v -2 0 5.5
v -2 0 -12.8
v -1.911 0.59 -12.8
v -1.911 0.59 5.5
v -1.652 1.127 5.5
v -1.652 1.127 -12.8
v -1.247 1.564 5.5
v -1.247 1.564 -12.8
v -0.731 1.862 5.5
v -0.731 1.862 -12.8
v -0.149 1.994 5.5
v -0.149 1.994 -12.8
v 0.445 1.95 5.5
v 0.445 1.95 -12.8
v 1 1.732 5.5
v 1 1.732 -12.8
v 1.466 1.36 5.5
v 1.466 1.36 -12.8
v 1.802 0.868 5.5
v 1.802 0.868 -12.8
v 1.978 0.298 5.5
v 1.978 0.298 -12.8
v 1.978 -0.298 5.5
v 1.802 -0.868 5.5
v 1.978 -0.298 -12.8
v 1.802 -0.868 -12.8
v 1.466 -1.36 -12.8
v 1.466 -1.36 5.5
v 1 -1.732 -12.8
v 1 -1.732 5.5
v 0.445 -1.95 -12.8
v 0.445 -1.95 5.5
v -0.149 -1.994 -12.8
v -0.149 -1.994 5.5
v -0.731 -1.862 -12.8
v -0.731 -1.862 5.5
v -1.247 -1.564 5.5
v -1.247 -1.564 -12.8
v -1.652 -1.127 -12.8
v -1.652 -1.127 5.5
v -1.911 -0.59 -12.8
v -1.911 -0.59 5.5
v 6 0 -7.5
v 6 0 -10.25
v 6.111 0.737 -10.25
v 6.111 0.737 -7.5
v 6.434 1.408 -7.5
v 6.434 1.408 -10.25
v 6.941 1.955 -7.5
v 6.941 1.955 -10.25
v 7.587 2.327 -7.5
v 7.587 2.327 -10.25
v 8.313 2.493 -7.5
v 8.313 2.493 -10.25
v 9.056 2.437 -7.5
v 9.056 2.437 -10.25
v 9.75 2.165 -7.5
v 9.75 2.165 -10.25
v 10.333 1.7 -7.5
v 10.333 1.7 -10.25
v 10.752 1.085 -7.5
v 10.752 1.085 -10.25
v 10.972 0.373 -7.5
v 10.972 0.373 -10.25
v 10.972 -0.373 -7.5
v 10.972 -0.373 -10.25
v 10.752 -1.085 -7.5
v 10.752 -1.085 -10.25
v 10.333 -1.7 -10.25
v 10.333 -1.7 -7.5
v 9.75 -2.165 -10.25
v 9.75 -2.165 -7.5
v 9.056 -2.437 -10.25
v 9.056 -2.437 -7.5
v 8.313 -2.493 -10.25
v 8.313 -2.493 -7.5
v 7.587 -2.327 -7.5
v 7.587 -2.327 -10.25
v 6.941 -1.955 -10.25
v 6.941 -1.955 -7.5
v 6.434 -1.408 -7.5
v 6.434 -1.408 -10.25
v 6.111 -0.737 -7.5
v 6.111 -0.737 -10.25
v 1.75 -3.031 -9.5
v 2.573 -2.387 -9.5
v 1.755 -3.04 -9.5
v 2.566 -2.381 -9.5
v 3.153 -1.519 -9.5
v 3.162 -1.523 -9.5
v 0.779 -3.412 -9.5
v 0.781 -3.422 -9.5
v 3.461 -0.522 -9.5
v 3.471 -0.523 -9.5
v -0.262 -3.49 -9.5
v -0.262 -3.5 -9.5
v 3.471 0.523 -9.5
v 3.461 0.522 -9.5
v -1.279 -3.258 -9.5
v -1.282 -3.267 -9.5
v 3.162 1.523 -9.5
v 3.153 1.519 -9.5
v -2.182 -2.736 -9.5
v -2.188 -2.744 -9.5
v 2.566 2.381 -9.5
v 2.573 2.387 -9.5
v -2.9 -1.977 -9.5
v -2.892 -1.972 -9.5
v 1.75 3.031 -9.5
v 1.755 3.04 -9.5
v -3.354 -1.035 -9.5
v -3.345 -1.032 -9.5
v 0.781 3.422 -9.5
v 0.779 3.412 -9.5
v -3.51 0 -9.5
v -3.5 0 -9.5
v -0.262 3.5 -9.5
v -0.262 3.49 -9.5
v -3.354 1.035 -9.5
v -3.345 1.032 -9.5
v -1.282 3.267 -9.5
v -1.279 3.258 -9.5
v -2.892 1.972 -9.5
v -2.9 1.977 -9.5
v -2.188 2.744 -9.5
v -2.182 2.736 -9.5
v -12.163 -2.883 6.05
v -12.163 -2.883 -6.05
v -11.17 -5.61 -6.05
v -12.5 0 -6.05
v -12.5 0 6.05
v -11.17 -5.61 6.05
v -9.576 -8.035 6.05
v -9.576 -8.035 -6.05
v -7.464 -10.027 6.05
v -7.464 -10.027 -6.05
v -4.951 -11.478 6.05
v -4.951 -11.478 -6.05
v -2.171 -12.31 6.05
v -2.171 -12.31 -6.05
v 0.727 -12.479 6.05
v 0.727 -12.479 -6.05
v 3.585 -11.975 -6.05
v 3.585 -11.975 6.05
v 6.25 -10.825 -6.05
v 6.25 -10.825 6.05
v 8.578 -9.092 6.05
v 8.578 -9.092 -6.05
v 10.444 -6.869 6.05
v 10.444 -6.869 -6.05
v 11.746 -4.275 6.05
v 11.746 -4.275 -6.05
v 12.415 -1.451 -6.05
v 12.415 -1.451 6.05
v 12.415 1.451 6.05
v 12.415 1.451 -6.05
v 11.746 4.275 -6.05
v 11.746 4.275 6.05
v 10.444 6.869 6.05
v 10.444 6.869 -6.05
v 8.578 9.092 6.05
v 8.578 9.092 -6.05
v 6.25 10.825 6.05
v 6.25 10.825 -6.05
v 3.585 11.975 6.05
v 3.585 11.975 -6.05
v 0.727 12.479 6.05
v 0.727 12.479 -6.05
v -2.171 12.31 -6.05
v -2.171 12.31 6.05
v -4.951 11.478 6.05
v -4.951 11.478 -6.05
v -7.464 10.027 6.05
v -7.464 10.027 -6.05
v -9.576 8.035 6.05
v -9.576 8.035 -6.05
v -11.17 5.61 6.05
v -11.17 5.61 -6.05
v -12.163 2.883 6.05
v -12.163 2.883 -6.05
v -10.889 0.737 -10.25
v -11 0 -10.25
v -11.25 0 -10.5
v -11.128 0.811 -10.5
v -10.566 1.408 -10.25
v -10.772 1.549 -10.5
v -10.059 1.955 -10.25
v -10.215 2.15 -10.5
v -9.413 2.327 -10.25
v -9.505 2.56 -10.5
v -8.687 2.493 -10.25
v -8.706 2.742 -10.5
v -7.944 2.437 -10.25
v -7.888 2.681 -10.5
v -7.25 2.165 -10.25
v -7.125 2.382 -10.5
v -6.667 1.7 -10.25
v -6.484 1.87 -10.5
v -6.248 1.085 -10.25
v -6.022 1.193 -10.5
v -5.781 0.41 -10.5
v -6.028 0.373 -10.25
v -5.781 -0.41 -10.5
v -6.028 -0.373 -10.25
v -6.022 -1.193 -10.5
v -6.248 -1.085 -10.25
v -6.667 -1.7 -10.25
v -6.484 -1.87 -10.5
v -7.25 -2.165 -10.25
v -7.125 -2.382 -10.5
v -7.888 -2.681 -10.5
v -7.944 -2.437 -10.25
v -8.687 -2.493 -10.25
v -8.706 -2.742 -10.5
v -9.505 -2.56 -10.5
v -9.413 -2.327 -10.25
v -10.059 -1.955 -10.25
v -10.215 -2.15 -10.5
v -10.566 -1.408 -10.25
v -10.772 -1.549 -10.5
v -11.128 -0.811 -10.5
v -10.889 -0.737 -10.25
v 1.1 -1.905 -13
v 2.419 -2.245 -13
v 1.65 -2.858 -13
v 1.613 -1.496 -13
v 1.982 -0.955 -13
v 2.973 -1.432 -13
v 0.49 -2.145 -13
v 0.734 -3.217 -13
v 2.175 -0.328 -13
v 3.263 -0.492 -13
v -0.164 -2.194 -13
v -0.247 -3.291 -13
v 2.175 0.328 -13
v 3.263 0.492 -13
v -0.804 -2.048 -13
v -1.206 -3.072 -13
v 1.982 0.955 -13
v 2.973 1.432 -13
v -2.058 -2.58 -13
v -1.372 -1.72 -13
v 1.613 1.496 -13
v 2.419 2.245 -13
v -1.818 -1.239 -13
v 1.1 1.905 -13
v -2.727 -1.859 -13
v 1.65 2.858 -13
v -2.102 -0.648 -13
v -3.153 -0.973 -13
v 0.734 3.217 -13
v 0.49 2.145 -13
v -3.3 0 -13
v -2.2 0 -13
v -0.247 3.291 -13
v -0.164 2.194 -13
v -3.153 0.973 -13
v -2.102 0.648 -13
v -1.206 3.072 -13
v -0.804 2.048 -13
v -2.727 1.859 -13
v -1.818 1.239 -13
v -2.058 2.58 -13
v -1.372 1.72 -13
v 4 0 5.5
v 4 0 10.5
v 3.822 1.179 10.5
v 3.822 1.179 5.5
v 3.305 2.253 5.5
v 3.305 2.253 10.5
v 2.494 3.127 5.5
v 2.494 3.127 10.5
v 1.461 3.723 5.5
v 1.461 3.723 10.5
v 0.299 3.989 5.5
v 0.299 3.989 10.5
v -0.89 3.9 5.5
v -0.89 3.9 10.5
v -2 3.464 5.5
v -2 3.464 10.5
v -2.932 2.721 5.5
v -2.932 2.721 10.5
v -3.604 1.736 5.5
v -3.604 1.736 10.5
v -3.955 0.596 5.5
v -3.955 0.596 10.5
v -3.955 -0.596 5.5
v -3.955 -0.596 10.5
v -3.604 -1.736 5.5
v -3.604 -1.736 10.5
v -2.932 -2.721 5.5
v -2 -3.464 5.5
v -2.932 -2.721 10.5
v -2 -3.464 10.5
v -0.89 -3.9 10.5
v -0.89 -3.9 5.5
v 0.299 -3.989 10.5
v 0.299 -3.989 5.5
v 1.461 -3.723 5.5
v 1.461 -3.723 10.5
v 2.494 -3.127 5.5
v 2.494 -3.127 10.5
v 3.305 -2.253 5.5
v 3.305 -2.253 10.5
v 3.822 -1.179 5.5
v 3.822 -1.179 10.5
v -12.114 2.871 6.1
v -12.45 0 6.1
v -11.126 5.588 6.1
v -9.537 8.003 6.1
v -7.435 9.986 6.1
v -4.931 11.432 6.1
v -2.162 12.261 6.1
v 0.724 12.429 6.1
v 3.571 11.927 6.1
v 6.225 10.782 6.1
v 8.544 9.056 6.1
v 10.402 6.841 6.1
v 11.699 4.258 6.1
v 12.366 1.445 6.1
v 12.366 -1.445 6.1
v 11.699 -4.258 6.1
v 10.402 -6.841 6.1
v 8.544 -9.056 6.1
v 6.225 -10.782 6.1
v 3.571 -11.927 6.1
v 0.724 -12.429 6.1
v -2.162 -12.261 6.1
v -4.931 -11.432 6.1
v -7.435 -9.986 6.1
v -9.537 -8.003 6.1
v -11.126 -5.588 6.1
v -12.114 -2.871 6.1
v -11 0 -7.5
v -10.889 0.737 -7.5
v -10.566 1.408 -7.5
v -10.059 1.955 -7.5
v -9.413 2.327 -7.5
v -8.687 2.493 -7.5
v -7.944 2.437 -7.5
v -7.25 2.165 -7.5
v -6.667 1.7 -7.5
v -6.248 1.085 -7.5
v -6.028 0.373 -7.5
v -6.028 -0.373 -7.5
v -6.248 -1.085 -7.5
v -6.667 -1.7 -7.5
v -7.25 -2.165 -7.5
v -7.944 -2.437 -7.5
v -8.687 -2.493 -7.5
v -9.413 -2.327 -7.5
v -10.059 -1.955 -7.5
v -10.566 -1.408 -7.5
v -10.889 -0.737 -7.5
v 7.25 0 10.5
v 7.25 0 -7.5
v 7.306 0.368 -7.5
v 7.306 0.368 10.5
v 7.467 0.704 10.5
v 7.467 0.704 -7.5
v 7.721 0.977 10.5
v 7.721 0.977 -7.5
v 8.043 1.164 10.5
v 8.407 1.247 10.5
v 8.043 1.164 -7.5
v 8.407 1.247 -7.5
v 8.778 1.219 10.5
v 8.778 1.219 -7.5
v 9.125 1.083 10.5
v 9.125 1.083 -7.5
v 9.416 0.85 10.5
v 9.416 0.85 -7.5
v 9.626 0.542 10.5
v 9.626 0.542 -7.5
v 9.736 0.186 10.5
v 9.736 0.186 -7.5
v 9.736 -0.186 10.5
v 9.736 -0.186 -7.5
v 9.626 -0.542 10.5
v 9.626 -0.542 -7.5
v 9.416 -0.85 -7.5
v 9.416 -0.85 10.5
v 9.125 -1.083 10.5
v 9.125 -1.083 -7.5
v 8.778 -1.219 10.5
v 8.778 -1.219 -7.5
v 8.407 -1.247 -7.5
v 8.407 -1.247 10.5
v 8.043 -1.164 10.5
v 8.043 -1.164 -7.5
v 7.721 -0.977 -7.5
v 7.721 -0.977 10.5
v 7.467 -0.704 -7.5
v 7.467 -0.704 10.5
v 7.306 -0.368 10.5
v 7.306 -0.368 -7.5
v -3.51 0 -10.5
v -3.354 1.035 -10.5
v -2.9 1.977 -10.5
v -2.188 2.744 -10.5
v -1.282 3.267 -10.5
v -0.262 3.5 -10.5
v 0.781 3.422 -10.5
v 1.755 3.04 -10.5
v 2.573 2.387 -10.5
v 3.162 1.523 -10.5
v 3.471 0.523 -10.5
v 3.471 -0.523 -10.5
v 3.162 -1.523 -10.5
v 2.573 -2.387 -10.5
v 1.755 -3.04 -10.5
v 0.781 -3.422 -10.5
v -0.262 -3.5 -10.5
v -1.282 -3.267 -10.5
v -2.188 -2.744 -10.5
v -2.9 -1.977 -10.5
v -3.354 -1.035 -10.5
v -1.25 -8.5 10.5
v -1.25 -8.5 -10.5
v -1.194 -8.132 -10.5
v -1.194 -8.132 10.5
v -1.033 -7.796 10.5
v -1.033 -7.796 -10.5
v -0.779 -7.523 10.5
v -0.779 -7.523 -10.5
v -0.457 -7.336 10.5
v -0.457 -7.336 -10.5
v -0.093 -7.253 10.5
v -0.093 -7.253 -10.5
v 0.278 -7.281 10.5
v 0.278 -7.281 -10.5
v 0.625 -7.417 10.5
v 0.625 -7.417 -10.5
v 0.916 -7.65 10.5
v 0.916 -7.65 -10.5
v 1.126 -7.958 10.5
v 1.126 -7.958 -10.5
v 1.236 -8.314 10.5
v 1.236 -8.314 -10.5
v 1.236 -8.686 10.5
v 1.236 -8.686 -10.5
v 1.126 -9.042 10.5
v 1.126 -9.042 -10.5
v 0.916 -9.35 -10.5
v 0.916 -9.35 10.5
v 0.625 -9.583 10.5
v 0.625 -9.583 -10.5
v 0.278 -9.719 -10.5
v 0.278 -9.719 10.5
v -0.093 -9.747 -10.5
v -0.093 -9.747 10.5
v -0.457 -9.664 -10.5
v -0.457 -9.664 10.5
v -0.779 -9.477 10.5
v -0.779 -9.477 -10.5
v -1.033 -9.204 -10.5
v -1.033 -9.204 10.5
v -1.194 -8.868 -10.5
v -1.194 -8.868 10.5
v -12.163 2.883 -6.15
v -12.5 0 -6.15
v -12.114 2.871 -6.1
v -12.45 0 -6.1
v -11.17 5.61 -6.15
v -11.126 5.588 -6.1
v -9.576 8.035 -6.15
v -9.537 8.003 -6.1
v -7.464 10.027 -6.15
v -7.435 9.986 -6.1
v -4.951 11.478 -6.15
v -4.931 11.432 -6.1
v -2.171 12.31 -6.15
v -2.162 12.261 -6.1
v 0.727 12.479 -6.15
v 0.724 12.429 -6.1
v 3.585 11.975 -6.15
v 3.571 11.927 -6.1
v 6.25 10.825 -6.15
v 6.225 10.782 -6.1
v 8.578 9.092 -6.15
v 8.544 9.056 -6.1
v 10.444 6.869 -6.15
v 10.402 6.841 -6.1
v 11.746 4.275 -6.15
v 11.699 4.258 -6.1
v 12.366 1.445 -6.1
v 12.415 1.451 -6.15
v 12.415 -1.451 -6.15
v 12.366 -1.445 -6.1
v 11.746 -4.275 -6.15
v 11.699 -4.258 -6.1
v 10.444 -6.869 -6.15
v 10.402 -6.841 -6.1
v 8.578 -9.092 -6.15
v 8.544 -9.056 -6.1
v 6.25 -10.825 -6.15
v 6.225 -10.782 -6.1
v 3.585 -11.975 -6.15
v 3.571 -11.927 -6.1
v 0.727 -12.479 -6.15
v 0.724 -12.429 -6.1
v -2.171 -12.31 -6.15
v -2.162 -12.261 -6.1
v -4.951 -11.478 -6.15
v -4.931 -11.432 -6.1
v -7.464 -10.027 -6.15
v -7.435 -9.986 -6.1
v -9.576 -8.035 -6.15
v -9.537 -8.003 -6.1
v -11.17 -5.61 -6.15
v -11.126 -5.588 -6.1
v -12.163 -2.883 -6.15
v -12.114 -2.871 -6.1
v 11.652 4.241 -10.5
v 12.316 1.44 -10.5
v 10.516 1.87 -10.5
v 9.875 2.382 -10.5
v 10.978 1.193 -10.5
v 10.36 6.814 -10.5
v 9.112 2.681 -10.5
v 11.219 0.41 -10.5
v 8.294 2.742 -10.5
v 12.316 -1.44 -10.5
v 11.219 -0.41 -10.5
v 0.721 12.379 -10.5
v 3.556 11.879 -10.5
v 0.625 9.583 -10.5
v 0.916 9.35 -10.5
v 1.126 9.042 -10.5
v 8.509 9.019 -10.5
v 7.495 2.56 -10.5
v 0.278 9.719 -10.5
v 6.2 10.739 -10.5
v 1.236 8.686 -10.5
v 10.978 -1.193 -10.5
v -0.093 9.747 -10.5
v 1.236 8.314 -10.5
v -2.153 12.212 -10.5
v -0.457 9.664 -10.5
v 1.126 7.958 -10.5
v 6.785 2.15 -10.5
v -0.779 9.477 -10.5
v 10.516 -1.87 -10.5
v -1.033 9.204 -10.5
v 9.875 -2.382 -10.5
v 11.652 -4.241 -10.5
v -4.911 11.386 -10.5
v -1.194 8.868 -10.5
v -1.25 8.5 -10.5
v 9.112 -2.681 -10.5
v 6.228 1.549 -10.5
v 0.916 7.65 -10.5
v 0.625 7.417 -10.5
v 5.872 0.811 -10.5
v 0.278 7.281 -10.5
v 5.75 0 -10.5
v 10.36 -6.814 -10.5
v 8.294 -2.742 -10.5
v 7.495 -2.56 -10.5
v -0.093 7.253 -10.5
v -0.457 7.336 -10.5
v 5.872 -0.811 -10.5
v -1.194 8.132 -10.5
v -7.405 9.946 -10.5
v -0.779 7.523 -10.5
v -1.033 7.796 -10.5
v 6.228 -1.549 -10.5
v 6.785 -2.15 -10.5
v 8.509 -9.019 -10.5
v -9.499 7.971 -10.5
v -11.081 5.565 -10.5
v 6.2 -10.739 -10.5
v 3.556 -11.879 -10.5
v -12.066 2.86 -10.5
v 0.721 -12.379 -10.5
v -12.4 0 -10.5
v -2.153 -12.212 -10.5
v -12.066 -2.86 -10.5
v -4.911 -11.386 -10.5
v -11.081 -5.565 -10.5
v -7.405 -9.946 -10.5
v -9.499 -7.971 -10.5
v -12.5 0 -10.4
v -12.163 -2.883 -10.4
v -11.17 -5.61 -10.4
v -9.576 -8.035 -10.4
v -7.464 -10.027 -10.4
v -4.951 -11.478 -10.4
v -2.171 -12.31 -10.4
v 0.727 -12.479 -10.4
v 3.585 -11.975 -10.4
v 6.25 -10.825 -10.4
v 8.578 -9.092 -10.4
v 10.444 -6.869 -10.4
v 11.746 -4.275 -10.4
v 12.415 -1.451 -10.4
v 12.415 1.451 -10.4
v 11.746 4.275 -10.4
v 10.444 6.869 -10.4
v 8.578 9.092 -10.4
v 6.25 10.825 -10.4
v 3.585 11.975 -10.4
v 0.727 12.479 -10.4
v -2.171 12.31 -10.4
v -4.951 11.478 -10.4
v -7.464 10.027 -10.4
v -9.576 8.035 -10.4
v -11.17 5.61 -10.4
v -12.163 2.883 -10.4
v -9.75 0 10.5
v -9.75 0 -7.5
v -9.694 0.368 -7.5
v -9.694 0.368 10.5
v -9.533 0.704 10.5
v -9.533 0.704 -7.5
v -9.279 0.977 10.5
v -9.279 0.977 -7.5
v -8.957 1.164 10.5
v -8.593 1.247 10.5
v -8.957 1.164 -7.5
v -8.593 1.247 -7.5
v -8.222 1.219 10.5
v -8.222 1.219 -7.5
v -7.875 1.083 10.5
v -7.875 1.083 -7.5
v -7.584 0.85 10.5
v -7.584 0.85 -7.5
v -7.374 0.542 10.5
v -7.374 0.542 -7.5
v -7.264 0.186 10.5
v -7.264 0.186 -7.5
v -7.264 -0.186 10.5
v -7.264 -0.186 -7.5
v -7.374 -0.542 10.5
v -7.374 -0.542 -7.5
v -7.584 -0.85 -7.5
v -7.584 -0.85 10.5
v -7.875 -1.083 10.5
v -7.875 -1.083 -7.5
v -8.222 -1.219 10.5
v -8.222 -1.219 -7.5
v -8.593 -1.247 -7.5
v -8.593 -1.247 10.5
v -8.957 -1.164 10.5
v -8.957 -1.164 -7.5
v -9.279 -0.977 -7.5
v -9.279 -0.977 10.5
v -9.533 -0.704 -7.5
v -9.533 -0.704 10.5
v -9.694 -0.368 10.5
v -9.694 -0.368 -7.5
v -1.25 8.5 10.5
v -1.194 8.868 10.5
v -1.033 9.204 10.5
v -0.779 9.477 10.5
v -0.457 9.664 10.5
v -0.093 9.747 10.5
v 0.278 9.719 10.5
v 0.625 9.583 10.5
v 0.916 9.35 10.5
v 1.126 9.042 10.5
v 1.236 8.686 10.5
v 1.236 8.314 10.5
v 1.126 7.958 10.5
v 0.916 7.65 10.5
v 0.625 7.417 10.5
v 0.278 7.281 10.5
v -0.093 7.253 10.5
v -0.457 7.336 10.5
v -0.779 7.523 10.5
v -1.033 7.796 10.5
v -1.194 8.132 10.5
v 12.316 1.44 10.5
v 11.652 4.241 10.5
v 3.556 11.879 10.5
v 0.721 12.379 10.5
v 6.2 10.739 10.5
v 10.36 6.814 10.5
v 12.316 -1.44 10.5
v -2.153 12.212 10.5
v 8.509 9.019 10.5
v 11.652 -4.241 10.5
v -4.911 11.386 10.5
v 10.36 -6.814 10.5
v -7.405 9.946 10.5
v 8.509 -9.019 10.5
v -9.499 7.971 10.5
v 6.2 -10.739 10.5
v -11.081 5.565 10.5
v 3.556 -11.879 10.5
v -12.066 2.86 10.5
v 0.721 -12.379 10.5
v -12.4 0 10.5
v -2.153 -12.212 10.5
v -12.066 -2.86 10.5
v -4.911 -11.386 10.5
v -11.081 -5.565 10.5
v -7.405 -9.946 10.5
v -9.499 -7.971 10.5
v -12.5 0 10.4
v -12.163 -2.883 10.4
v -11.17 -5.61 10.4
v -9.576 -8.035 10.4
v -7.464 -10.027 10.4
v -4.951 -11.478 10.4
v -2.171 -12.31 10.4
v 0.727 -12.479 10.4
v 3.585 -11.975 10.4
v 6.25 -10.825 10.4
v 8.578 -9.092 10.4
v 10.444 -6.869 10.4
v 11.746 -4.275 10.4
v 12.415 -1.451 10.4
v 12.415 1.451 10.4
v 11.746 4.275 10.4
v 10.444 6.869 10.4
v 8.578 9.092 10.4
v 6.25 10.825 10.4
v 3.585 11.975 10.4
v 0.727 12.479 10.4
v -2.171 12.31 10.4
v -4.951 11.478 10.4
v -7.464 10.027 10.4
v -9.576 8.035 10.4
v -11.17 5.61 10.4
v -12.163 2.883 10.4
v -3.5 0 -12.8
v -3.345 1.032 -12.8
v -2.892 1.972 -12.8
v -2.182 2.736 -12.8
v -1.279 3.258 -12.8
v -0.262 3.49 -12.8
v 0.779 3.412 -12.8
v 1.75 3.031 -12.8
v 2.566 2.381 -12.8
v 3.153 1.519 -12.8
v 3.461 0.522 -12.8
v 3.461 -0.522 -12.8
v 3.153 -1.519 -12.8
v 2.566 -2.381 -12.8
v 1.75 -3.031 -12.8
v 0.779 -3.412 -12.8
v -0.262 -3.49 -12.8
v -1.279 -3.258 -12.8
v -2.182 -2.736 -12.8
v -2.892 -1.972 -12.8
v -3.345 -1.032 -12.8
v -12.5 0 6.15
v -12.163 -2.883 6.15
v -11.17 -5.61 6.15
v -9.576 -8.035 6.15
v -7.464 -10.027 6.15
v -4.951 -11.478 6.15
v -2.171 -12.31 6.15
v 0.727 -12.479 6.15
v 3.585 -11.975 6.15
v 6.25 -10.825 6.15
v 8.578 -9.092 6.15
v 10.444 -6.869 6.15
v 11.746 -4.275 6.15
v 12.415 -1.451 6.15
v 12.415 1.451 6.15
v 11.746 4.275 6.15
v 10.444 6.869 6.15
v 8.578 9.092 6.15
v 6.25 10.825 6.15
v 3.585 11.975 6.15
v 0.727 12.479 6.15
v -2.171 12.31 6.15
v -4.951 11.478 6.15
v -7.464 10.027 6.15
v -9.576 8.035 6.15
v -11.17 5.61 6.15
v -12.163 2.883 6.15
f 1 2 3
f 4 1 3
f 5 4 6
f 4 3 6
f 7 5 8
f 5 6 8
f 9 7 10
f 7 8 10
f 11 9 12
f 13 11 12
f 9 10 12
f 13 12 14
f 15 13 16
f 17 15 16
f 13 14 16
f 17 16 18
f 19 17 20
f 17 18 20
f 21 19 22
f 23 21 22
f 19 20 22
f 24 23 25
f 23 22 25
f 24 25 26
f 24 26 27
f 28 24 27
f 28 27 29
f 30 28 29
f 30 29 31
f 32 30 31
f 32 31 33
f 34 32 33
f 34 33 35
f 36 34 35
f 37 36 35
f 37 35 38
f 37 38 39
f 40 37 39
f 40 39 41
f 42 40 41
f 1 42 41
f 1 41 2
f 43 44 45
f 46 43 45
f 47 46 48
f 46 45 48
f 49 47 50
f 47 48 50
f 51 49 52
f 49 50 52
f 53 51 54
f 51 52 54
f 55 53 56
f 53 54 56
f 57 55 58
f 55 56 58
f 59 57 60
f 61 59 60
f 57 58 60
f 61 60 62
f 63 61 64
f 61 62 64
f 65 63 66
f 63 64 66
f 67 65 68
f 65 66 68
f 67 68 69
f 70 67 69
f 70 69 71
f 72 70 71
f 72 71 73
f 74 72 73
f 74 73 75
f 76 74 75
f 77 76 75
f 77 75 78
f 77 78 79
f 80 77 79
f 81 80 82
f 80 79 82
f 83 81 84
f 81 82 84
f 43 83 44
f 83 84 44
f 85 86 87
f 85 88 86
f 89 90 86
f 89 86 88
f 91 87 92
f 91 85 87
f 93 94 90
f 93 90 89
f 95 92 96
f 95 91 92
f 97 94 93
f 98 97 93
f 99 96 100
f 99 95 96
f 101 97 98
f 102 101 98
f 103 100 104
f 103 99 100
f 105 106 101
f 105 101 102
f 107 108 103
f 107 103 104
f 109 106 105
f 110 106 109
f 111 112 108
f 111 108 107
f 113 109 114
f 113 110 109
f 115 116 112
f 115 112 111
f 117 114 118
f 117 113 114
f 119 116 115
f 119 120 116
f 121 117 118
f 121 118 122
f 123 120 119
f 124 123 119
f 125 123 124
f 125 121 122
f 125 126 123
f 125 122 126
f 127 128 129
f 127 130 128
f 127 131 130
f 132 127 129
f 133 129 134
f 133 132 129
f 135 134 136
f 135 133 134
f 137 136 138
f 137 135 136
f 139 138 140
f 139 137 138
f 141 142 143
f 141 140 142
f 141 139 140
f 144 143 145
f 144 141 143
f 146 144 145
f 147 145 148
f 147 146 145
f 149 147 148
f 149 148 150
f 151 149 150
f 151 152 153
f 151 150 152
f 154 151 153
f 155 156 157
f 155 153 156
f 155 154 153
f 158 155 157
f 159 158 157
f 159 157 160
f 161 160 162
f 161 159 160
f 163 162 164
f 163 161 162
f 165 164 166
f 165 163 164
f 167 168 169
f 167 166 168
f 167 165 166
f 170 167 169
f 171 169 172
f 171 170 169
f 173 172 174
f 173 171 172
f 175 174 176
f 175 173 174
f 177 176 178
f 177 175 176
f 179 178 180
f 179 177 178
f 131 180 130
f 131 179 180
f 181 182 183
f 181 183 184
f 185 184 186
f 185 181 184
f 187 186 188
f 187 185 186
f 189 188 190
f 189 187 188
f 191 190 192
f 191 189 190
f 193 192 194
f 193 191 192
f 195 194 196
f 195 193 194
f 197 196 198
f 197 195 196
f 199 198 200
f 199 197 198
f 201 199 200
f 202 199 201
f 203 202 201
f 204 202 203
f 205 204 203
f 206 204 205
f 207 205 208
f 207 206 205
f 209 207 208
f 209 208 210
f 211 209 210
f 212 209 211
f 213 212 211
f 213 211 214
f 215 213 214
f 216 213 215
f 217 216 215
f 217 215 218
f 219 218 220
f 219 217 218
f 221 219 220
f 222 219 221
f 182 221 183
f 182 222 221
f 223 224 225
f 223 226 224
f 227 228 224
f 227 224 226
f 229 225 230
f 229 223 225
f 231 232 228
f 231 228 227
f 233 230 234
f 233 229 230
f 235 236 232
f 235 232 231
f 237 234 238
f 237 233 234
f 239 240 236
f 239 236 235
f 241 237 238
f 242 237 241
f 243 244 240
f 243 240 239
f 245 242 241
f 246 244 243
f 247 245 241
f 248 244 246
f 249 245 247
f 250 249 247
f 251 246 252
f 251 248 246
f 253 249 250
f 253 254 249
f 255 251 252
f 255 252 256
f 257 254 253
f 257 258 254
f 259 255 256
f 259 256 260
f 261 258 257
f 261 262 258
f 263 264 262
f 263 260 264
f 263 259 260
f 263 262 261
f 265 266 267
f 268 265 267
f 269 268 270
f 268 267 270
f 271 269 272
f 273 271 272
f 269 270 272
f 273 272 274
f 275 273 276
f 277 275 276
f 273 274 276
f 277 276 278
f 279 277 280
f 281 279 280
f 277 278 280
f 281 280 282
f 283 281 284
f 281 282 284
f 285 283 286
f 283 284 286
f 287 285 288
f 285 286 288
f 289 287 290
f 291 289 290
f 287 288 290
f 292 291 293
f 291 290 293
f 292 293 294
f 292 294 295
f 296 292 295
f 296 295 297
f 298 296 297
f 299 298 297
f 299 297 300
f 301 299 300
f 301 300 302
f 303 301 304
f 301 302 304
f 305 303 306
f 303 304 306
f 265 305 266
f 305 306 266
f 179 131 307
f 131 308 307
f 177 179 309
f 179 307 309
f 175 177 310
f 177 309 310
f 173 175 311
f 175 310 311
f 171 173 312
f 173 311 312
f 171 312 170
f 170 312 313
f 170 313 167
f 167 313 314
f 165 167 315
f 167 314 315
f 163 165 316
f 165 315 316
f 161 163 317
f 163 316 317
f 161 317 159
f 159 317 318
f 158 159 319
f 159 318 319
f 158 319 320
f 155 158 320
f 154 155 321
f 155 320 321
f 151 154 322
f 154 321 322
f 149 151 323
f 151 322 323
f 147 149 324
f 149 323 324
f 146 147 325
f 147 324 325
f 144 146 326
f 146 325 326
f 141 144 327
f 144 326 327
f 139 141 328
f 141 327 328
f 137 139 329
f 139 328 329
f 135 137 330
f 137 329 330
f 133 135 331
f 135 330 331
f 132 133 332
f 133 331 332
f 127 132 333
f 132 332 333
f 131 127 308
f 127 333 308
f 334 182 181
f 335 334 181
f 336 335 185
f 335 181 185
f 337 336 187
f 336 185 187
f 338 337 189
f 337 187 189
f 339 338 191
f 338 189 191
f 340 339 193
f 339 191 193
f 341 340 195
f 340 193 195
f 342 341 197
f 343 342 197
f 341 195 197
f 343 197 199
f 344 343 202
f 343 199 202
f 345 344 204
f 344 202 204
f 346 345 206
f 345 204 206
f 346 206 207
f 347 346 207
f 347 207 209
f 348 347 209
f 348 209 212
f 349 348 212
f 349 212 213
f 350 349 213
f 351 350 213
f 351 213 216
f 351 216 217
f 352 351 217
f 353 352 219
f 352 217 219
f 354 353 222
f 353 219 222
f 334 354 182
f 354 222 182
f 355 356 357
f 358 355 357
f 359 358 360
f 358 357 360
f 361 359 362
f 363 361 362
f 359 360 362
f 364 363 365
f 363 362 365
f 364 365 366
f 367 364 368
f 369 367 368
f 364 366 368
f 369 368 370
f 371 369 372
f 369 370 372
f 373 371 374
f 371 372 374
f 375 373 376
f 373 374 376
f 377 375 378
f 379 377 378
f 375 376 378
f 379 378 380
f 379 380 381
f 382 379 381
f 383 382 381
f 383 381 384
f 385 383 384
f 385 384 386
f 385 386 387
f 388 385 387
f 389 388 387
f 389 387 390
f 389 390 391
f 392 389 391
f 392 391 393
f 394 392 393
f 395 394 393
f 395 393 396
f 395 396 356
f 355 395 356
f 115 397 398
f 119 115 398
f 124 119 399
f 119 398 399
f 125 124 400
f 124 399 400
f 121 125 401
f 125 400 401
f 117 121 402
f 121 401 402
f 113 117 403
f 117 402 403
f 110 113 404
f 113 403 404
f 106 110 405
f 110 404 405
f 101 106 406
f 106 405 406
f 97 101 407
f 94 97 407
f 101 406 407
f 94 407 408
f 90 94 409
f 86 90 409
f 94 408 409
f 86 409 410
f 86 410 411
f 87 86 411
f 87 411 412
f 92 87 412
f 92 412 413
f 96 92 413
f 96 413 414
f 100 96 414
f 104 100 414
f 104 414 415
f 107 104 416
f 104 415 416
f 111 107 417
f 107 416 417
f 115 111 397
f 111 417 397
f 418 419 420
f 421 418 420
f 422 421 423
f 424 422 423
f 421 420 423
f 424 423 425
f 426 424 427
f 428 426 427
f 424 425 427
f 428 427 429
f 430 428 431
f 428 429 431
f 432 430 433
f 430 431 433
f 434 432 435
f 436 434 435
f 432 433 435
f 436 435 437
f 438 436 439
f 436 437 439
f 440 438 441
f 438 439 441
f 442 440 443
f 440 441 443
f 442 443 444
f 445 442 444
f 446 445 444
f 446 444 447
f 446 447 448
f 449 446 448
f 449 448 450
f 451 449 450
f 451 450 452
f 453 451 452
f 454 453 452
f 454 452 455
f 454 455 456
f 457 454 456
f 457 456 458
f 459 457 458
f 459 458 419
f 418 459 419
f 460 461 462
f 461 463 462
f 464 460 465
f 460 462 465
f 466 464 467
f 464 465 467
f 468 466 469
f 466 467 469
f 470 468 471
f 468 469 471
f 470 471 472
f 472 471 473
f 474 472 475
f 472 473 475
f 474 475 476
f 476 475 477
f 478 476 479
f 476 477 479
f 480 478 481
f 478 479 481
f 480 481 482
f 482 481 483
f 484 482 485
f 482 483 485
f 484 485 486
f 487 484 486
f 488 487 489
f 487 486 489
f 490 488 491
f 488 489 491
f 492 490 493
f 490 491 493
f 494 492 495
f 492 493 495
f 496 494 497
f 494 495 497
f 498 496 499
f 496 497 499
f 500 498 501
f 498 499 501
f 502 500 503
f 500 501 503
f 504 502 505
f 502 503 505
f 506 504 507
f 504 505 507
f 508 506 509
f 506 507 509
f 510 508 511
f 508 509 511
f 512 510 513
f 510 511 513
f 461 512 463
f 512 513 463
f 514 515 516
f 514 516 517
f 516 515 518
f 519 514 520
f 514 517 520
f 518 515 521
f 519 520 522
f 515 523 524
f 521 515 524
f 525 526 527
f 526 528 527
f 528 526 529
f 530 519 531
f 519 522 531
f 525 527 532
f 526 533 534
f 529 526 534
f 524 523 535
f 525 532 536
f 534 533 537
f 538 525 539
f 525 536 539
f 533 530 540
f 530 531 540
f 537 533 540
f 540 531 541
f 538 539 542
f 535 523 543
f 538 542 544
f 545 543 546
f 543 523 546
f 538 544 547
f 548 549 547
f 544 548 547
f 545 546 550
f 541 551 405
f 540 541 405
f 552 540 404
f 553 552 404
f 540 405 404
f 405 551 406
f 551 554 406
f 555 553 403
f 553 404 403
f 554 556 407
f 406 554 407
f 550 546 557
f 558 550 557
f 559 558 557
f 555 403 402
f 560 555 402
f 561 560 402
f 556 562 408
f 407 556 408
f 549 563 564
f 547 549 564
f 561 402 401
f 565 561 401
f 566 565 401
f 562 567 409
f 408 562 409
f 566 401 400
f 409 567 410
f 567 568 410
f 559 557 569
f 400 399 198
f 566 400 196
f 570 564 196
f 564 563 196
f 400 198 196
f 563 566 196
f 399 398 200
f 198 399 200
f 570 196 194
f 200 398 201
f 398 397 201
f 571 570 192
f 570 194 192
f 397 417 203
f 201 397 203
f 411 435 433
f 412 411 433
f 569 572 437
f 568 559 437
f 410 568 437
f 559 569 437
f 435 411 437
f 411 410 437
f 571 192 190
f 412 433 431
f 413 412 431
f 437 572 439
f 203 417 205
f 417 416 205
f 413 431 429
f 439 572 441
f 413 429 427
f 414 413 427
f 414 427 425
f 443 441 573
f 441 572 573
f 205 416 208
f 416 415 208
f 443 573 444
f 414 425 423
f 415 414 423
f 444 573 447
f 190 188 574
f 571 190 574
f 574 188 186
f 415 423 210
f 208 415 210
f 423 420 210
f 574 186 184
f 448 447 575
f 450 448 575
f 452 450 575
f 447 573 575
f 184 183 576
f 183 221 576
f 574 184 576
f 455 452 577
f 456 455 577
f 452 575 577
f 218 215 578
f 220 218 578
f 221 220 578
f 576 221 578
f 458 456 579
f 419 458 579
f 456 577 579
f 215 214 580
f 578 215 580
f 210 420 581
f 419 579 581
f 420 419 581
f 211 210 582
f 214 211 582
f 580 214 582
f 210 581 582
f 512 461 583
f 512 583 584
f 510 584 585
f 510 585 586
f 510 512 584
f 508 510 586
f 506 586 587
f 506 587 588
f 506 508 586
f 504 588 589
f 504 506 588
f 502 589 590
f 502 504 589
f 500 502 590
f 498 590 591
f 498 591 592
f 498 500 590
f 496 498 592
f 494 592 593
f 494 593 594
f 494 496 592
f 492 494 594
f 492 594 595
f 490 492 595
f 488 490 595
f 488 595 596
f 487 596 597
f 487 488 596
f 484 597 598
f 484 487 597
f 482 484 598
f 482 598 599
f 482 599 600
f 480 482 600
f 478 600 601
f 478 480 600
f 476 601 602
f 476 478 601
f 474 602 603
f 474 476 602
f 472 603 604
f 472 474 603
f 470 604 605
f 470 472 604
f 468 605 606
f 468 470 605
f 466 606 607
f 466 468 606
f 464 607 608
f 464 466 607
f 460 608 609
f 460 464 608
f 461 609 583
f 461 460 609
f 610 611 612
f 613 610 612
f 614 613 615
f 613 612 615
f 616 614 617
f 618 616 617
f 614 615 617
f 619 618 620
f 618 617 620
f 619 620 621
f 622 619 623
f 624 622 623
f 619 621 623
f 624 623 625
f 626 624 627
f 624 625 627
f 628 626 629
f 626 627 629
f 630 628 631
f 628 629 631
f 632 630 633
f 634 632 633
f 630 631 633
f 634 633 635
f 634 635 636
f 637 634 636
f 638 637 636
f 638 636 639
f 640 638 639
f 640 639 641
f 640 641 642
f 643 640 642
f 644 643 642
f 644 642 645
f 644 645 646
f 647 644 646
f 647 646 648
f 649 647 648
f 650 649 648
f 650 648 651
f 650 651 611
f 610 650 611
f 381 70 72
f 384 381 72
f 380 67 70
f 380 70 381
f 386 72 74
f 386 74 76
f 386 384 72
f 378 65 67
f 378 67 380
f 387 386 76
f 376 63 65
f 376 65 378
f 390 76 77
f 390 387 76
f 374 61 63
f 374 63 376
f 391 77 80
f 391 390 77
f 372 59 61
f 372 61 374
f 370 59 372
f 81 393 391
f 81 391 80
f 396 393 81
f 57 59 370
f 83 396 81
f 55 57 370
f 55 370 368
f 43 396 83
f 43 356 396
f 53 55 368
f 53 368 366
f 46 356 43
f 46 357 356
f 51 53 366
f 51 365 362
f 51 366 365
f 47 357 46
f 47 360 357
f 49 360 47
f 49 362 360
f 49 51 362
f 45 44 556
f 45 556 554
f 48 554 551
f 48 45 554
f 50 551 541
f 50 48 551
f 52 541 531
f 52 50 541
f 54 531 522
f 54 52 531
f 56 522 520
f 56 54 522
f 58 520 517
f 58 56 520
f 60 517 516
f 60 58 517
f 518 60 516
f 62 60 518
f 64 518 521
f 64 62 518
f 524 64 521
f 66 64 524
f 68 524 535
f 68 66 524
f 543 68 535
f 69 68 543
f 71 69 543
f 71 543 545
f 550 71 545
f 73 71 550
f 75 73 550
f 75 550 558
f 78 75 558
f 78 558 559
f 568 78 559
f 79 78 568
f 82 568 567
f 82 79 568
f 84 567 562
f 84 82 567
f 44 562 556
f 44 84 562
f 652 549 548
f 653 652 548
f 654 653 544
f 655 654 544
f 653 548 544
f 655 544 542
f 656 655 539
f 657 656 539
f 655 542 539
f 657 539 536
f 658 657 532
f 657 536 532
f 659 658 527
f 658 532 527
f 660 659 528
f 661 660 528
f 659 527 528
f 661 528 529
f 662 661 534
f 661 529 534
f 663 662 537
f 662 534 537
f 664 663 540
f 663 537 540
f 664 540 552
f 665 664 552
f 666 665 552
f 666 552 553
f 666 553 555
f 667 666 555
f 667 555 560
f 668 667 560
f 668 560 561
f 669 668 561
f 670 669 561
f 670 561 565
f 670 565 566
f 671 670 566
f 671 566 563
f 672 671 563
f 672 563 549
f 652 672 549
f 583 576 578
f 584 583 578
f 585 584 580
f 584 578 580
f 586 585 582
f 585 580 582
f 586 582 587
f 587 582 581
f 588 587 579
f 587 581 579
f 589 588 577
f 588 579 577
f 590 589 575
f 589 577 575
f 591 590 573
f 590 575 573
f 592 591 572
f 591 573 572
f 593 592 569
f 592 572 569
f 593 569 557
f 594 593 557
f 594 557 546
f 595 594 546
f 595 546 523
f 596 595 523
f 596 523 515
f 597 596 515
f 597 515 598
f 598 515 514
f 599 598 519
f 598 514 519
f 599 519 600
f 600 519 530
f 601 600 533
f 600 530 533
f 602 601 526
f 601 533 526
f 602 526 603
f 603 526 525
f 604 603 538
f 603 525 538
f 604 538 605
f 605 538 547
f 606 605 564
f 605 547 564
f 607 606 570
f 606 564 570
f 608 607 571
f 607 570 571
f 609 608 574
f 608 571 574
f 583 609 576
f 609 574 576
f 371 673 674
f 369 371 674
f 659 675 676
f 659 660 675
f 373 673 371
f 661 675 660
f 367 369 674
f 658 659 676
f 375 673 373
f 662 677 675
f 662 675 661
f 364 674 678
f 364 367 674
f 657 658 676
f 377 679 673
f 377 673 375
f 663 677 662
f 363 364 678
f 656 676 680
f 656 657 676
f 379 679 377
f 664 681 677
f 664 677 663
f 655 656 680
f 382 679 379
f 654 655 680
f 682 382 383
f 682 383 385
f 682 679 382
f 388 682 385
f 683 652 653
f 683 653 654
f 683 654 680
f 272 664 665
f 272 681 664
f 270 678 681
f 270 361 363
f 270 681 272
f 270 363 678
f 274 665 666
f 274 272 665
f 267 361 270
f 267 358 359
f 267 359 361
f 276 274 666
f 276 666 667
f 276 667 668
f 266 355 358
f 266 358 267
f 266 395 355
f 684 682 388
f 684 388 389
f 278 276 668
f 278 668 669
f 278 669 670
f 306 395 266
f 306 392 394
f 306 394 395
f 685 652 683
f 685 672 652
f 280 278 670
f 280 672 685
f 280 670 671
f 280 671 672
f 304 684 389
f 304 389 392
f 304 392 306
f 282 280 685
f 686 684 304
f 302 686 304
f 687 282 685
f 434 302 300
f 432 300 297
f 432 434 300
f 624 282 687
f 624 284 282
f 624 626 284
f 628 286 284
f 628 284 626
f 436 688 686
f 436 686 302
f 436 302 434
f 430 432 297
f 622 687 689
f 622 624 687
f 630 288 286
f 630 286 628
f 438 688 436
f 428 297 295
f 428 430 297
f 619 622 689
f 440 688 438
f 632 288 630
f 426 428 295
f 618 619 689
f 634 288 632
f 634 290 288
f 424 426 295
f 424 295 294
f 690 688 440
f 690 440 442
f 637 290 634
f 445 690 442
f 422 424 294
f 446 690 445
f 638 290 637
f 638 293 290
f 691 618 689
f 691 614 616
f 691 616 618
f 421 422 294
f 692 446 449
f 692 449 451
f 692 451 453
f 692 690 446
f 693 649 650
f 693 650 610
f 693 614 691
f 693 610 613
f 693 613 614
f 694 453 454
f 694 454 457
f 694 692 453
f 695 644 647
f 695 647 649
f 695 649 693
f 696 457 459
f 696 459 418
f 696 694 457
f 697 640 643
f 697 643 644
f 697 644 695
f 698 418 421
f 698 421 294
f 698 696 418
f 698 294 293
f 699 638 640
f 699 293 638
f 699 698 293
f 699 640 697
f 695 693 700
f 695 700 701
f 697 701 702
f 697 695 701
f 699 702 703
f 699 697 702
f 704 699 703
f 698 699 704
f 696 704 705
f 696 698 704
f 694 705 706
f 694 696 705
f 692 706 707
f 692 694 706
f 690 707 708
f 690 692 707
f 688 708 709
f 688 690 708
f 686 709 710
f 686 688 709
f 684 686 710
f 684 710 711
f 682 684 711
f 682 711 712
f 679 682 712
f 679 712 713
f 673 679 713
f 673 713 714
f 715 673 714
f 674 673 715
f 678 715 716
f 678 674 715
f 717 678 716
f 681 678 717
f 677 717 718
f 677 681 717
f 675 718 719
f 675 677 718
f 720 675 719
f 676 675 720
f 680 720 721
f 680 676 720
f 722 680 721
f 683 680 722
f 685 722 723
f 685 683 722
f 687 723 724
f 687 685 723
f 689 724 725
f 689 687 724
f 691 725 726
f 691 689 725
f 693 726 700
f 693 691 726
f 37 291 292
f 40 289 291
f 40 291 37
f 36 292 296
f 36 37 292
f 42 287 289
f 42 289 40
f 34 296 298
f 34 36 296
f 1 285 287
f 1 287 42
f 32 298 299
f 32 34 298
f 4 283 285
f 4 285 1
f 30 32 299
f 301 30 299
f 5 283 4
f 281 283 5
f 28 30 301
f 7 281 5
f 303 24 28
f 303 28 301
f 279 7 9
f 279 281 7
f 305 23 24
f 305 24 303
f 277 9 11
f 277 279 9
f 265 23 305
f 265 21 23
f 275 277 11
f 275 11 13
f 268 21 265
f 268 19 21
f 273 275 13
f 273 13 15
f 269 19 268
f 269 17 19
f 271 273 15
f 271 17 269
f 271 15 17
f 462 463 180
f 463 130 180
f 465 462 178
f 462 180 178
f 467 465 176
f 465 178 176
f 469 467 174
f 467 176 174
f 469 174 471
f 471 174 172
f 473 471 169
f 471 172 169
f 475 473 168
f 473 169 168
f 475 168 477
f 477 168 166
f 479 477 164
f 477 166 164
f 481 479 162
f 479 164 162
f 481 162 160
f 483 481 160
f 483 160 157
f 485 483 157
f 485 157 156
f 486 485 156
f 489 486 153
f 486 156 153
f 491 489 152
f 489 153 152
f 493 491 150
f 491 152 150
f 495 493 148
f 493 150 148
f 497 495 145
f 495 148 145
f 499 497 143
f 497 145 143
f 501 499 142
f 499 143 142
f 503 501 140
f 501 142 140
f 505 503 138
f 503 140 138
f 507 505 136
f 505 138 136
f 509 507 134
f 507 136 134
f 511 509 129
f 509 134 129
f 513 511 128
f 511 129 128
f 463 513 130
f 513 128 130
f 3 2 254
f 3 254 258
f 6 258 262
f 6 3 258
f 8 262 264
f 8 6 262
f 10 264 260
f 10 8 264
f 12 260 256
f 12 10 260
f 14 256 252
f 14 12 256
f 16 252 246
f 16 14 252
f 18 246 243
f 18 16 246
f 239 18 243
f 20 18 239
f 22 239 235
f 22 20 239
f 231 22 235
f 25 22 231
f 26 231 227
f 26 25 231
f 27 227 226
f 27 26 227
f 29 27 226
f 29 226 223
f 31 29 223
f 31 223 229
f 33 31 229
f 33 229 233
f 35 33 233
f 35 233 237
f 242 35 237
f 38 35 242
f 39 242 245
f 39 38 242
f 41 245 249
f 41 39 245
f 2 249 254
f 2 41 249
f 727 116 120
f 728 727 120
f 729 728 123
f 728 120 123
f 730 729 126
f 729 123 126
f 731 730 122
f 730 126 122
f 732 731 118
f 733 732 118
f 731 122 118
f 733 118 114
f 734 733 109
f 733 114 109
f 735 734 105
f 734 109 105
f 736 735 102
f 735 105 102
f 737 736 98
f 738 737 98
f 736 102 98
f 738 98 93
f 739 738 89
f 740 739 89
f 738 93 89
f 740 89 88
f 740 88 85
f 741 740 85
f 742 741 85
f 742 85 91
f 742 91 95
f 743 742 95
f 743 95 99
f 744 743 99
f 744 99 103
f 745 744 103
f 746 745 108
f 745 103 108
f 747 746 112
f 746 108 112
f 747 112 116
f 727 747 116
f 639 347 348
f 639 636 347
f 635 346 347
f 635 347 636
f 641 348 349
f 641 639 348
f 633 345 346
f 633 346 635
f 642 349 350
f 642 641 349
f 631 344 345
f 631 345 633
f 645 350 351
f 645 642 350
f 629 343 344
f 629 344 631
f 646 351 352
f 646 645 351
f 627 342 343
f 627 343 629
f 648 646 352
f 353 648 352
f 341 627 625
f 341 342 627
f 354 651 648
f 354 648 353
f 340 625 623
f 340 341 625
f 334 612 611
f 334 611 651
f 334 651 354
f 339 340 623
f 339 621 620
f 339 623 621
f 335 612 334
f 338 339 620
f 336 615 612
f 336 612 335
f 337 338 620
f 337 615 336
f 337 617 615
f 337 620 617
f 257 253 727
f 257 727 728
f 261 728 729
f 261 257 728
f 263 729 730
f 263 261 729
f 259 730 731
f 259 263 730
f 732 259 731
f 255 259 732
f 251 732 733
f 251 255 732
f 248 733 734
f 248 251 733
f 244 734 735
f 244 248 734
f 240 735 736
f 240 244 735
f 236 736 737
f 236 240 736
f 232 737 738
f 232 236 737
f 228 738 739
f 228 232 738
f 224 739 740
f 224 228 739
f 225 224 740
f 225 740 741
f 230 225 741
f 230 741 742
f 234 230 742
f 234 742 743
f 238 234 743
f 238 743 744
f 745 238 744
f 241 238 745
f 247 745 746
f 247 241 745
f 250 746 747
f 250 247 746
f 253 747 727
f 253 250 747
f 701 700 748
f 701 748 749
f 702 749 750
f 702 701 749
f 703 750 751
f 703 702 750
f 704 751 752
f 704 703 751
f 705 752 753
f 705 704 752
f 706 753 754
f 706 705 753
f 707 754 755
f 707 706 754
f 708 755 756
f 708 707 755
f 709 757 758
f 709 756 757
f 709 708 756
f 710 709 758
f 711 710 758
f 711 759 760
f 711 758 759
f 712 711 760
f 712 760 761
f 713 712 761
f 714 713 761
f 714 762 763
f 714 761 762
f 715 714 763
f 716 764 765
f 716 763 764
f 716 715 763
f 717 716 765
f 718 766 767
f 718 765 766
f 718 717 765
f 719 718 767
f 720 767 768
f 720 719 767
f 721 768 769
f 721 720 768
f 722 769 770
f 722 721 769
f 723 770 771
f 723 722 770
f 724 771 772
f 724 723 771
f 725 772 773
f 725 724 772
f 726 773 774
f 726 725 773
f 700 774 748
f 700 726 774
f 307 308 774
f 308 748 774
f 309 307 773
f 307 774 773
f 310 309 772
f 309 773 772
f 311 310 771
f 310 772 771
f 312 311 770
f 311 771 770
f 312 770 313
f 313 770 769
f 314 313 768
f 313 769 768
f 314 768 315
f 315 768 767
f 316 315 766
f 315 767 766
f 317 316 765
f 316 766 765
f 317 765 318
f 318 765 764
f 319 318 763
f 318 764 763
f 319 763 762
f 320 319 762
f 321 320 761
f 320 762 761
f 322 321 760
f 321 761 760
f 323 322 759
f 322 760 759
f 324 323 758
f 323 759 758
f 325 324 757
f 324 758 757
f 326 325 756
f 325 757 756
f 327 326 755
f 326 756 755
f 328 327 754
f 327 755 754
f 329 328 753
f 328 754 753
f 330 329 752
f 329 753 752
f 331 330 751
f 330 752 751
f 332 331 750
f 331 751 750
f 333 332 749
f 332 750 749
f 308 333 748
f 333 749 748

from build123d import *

# Parameters (mm, degrees)
SKETCH1_R           = 12.5
BOSS_EXTRUDE1_DEPTH = 10.5
CHAMFER1_SIZE       = 0.1
SKETCH4_R           = 3.51
CUT_EXTRUDE1_DEPTH  = 1
SKETCH5_R           = 3.5
BOSS_EXTRUDE2_DEPTH = 3.5
CUT_EXTRUDE2_REACH  = 31.407
SKETCH6_R           = 2
SKETCH7_R           = 4
CUT_EXTRUDE3_DEPTH  = 5
CHAMFER2_SIZE       = 0.2
CUT_EXTRUDE4_REACH  = 29.45
SKETCH8_R           = 1.25
SKETCH9_R           = 2.5
CUT_EXTRUDE5_DEPTH  = 3
CHAMFER3_SIZE       = 0.25


with BuildPart() as part:
    # Sketch1 → Boss-Extrude1 (new, symmetric)
    with BuildSketch(Plane.XY):
        with Locations(Location((0, 0, 0), (0, 0, 180))):
            Circle(SKETCH1_R)
    extrude(amount=BOSS_EXTRUDE1_DEPTH, both=True)

    # Sketch2 → Cut-Revolve1 (revolve, cut)
    with BuildSketch(Plane(origin=(0, 0, 0), x_dir=(0, 0, -1), z_dir=(1, 0, 0)), mode=Mode.PRIVATE) as cut_revolve1_sk:
        Polygon((-6.15, 12.5), (-6.05, 12.5), (-6.1, 12.45), align=None)
        Polygon((6.05, 12.5), (6.15, 12.5), (6.1, 12.45), align=None)
    revolve(cut_revolve1_sk.sketch.rotate(Axis((0, 0, 10.5), (0, 0, -1)), 270), axis=Axis((0, 0, 10.5), (0, 0, -1)), mode=Mode.SUBTRACT)

    # Chamfer1
    chamfer1_edges = [part.edges().sort_by_distance(p)[0] for p in [
        (12.5, 0, -10.5),
        (12.5, 0, 10.5),
    ]]
    chamfer(chamfer1_edges, length=CHAMFER1_SIZE)

    # Sketch4 → Cut-Extrude1 (cut)
    with BuildSketch(Plane(origin=(0, 0, -10.5), x_dir=(-1, 0, 0), z_dir=(0, 0, -1))):
        Circle(SKETCH4_R)
    extrude(amount=-CUT_EXTRUDE1_DEPTH, mode=Mode.SUBTRACT)

    # Sketch5 → Boss-Extrude2 (add)
    with BuildSketch(Plane(origin=(0, 0, -9.5), x_dir=(-1, 0, 0), z_dir=(0, 0, -1))):
        Circle(SKETCH5_R)
    extrude(amount=BOSS_EXTRUDE2_DEPTH)

    # Sketch6 → Cut-Extrude2 (cut, up to next)
    with BuildSketch(Plane(origin=(0, 0, -13), x_dir=(-1, 0, 0), z_dir=(0, 0, -1)), mode=Mode.PRIVATE) as cut_extrude2_sk1:
        Circle(SKETCH6_R)
    cut_extrude2_tool1 = extrude(cut_extrude2_sk1.sketch, amount=-CUT_EXTRUDE2_REACH, mode=Mode.PRIVATE) & part.part
    add(cut_extrude2_tool1.solids().sort_by_distance((0, 0, -13))[0], mode=Mode.SUBTRACT)

    # Sketch7 → Cut-Extrude3 (cut)
    with BuildSketch(Plane.XY.offset(10.5)):
        Circle(SKETCH7_R)
    extrude(amount=-CUT_EXTRUDE3_DEPTH, mode=Mode.SUBTRACT)

    # Chamfer2
    chamfer2_edges = [part.edges().sort_by_distance(p)[0] for p in [
        (3.5, 0, -13),
        (2, 0, -13),
    ]]
    chamfer(chamfer2_edges, length=CHAMFER2_SIZE)

    # Sketch8 → Cut-Extrude4 (cut, up to next)
    with BuildSketch(Plane(origin=(0, 0, -10.5), x_dir=(-1, 0, 0), z_dir=(0, 0, -1)), mode=Mode.PRIVATE) as cut_extrude4_sk1:
        with Locations((0, 8.5)):
            Circle(SKETCH8_R)
    cut_extrude4_tool1 = extrude(cut_extrude4_sk1.sketch, amount=-CUT_EXTRUDE4_REACH, mode=Mode.PRIVATE) & part.part
    # Sketch8 → Cut-Extrude4 (cut, up to next)
    with BuildSketch(Plane(origin=(0, 0, -10.5), x_dir=(-1, 0, 0), z_dir=(0, 0, -1)), mode=Mode.PRIVATE) as cut_extrude4_sk2:
        with Locations((8.5, 0)):
            Circle(SKETCH8_R)
    cut_extrude4_tool2 = extrude(cut_extrude4_sk2.sketch, amount=-CUT_EXTRUDE4_REACH, mode=Mode.PRIVATE) & part.part
    # Sketch8 → Cut-Extrude4 (cut, up to next)
    with BuildSketch(Plane(origin=(0, 0, -10.5), x_dir=(-1, 0, 0), z_dir=(0, 0, -1)), mode=Mode.PRIVATE) as cut_extrude4_sk3:
        with Locations((0, -8.5)):
            Circle(SKETCH8_R)
    cut_extrude4_tool3 = extrude(cut_extrude4_sk3.sketch, amount=-CUT_EXTRUDE4_REACH, mode=Mode.PRIVATE) & part.part
    # Sketch8 → Cut-Extrude4 (cut, up to next)
    with BuildSketch(Plane(origin=(0, 0, -10.5), x_dir=(-1, 0, 0), z_dir=(0, 0, -1)), mode=Mode.PRIVATE) as cut_extrude4_sk4:
        with Locations((-8.5, 0)):
            Circle(SKETCH8_R)
    cut_extrude4_tool4 = extrude(cut_extrude4_sk4.sketch, amount=-CUT_EXTRUDE4_REACH, mode=Mode.PRIVATE) & part.part
    add(cut_extrude4_tool1.solids().sort_by_distance((0, 8.5, -10.5))[0], mode=Mode.SUBTRACT)
    add(cut_extrude4_tool2.solids().sort_by_distance((-8.5, 0, -10.5))[0], mode=Mode.SUBTRACT)
    add(cut_extrude4_tool3.solids().sort_by_distance((0, -8.5, -10.5))[0], mode=Mode.SUBTRACT)
    add(cut_extrude4_tool4.solids().sort_by_distance((8.5, 0, -10.5))[0], mode=Mode.SUBTRACT)

    # Sketch9 → Cut-Extrude5 (cut)
    with BuildSketch(Plane(origin=(0, 0, -10.5), x_dir=(-1, 0, 0), z_dir=(0, 0, -1))):
        with Locations((-8.5, 0)):
            Circle(SKETCH9_R)
        with Locations((8.5, 0)):
            Circle(SKETCH9_R)
    extrude(amount=-CUT_EXTRUDE5_DEPTH, mode=Mode.SUBTRACT)

    # Chamfer3
    chamfer3_edges = [part.edges().sort_by_distance(p)[0] for p in [
        (11, 0, -10.5),
        (-6, 0, -10.5),
    ]]
    chamfer(chamfer3_edges, length=CHAMFER3_SIZE)


solid = part.part
